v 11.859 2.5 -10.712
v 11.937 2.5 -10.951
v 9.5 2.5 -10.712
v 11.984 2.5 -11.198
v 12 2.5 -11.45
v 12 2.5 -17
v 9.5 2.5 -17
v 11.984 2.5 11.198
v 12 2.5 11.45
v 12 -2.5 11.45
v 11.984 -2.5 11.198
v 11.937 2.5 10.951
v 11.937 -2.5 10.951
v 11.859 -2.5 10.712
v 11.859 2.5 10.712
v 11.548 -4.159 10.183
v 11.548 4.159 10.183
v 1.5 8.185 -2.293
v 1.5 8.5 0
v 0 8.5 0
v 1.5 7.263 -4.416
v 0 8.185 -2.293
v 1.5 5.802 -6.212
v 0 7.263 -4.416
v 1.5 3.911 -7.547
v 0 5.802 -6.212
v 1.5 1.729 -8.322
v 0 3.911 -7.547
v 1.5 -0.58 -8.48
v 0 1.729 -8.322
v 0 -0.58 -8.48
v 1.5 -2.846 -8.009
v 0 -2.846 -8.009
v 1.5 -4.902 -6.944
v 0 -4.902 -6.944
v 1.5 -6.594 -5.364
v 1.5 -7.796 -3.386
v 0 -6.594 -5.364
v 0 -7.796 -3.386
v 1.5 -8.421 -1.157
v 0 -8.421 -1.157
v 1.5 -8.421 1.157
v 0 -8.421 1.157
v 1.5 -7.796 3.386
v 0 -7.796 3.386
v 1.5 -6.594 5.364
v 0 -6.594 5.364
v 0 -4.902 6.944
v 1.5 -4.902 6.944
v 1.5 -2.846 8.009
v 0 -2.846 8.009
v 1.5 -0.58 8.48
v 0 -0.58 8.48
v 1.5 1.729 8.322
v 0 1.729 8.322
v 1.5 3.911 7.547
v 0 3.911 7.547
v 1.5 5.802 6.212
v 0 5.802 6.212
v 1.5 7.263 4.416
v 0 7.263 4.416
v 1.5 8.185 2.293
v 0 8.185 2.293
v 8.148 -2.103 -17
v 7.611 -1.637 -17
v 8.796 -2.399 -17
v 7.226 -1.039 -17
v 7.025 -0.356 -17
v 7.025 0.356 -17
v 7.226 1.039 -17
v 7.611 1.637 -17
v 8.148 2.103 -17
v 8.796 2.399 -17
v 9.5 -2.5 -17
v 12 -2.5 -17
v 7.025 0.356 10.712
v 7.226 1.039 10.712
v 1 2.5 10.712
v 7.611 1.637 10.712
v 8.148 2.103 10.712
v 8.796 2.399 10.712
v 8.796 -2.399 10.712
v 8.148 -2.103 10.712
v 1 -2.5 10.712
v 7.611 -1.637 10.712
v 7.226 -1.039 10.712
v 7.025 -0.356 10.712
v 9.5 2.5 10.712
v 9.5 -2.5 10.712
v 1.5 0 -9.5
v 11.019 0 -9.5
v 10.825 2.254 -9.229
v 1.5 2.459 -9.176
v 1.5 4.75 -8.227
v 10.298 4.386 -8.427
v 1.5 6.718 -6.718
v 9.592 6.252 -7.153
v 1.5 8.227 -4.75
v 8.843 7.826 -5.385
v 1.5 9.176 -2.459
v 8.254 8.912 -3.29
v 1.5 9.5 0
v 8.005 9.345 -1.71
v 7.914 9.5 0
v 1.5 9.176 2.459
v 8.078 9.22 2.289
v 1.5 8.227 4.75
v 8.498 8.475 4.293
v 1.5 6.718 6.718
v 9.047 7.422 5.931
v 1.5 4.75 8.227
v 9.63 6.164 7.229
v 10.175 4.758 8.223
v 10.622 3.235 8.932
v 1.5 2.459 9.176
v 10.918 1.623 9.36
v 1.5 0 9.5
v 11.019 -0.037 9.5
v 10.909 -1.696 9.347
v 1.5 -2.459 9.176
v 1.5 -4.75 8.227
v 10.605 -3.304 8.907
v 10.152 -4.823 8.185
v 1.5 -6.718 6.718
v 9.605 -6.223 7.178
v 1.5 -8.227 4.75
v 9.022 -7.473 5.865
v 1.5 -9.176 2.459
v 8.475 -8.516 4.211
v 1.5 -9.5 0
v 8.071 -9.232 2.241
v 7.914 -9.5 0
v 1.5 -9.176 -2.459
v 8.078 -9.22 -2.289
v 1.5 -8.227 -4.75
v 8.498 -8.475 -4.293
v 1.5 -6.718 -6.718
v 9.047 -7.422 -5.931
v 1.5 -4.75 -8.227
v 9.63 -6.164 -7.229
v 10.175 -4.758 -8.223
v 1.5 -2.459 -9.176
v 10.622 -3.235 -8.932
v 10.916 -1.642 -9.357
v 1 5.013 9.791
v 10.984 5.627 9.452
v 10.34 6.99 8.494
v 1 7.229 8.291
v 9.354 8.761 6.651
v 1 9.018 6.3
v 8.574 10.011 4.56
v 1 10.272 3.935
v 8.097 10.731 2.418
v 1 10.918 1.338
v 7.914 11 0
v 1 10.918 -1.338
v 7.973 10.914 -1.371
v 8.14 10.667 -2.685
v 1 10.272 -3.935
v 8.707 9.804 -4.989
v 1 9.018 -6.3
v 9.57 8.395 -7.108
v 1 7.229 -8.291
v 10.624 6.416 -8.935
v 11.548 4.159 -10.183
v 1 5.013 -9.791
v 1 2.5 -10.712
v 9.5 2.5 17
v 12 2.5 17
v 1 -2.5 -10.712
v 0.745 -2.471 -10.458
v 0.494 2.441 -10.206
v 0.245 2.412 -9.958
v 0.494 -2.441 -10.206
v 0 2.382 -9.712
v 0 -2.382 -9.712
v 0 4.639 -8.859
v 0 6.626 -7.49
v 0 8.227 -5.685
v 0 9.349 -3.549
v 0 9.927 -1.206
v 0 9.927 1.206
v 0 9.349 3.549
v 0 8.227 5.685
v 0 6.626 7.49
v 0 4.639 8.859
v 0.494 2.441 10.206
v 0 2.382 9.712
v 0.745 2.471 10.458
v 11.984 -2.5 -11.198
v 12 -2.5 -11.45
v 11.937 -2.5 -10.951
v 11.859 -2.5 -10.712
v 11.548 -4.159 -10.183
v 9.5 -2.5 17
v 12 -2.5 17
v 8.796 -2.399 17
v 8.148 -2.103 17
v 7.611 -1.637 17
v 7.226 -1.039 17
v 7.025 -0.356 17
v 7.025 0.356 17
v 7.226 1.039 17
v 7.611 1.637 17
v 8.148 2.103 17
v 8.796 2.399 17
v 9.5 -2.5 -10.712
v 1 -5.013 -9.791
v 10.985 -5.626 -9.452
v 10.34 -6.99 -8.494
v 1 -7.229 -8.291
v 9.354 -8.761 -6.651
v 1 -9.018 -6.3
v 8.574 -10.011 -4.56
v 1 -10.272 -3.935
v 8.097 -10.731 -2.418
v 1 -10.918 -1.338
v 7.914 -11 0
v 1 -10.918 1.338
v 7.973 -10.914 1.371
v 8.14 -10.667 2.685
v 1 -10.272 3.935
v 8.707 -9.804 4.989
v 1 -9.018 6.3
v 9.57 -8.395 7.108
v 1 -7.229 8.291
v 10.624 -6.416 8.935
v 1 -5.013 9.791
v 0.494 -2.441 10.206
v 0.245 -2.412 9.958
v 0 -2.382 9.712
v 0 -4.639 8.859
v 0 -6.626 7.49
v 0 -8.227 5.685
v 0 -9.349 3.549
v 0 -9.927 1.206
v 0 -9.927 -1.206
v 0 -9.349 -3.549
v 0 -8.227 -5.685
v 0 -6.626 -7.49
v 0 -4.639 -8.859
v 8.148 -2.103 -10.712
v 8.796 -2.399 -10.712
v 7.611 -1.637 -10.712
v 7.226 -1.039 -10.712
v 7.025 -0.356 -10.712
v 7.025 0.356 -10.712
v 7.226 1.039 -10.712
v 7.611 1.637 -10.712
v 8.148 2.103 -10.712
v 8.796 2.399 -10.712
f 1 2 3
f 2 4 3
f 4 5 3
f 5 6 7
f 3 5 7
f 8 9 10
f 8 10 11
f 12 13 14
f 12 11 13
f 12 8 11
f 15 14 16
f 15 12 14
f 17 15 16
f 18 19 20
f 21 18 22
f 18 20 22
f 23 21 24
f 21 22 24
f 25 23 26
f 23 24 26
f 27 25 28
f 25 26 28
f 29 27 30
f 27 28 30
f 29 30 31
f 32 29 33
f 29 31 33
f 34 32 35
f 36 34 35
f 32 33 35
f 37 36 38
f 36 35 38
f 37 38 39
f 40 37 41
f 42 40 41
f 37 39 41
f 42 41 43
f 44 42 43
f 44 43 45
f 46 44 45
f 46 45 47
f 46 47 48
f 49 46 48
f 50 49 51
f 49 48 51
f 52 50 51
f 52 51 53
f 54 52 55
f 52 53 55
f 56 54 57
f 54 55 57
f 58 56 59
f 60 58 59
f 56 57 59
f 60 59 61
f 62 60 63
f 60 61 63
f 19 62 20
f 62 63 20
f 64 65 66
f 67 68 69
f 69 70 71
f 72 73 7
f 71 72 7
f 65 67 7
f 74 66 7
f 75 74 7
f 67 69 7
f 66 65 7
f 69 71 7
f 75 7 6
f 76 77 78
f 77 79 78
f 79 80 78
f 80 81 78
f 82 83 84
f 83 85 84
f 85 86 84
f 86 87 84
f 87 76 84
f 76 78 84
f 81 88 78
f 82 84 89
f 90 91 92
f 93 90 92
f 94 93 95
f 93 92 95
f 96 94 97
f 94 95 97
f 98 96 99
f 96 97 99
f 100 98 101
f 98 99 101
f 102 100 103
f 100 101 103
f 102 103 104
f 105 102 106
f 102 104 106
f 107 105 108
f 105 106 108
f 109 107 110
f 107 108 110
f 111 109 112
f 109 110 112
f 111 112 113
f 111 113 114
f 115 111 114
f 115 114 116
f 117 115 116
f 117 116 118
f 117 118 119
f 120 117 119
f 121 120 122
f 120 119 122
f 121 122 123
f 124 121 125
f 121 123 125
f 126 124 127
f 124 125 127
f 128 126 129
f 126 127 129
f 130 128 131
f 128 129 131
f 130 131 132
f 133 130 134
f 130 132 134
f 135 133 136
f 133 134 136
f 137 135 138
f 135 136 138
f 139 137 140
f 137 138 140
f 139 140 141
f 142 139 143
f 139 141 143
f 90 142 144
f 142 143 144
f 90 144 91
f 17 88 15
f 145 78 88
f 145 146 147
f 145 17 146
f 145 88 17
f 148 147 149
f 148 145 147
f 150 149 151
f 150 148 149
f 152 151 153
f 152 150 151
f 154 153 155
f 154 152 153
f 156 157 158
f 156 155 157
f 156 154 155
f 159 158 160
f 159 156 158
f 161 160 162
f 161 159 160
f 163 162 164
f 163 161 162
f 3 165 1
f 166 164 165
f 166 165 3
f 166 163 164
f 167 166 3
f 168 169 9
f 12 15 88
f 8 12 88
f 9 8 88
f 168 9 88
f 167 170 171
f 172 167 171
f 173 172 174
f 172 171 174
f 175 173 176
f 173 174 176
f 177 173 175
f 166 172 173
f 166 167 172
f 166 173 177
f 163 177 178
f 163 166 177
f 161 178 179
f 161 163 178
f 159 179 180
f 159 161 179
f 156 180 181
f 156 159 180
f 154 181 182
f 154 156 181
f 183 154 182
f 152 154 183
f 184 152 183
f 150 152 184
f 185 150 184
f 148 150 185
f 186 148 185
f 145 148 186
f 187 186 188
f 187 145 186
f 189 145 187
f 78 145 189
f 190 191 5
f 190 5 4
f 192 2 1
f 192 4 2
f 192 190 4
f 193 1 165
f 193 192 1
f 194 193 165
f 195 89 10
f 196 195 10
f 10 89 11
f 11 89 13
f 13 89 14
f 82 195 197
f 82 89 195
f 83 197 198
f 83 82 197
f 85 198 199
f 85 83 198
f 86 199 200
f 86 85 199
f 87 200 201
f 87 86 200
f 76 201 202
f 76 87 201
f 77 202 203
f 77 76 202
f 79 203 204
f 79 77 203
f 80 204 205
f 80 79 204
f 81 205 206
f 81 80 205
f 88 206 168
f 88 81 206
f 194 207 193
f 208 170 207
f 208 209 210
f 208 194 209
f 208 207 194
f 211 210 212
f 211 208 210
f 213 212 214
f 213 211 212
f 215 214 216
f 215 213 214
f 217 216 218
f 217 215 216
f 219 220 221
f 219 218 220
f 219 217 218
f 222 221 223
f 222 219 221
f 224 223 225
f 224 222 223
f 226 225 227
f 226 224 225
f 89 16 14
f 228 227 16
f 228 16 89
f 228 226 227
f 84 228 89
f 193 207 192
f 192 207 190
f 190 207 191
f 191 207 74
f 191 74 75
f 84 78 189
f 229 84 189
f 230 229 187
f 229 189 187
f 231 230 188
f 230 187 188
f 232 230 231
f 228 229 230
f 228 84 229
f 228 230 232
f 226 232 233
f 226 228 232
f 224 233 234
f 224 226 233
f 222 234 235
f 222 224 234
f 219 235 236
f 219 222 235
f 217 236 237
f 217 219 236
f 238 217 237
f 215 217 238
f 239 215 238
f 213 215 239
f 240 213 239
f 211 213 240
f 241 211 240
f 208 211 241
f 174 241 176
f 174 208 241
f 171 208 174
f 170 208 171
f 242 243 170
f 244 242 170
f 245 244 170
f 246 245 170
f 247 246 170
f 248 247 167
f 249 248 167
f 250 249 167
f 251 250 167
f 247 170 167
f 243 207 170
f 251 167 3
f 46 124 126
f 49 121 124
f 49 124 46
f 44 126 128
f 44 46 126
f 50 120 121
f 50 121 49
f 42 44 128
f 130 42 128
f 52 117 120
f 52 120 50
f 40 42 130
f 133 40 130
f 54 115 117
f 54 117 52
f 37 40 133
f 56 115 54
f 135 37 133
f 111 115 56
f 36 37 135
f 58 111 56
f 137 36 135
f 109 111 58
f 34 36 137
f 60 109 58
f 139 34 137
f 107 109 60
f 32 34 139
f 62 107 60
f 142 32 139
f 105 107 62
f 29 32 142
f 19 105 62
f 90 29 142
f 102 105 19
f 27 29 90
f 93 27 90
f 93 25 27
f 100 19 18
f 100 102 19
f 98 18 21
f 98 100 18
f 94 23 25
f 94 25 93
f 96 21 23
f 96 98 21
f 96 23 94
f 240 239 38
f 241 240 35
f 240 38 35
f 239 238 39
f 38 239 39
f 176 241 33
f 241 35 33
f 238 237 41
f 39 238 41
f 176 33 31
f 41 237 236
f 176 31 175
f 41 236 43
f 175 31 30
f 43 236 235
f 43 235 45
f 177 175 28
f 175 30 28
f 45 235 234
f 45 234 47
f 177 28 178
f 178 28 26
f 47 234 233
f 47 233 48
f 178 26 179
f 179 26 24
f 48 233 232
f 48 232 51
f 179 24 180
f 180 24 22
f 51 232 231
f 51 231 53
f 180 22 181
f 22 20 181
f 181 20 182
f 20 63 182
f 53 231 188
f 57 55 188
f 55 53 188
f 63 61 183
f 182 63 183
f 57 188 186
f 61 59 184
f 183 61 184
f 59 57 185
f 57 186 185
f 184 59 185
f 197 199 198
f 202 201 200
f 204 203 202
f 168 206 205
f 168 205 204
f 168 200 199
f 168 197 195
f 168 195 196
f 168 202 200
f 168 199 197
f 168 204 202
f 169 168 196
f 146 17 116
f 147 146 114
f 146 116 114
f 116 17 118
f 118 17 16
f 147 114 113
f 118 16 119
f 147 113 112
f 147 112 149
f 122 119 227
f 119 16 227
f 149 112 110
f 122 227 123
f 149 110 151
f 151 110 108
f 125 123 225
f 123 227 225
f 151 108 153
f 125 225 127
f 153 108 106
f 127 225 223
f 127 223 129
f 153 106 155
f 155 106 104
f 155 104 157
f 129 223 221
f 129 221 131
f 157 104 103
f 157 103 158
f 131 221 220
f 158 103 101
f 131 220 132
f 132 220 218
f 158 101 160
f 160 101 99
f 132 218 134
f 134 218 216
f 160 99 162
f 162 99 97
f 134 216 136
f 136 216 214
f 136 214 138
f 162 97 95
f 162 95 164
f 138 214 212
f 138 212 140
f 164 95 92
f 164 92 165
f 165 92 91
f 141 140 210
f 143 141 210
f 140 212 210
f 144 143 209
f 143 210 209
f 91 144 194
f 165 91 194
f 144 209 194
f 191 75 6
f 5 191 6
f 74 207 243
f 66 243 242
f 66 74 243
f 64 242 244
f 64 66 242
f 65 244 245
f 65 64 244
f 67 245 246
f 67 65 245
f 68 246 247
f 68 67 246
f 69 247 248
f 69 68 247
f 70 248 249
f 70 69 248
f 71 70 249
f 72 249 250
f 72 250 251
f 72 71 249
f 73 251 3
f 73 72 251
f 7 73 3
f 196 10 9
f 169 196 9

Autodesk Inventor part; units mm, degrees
ref_plane "YZ Plane" through (0, 0, 0) normal (1, 0, 0) x (0, 1, 0)
ref_plane "XZ Plane" through (0, 0, 0) normal (0, 1, 0) x (-1, 0, 0)
ref_plane "XY Plane" through (0, 0, 0) normal (0, 0, 1) x (1, 0, 0)
sketch "Sketch1" plane through (0, 0, 0) normal (1, 0, 0) x (0, 1, 0)
  circle A0 centre (0, 0) radius 11
  circle A1 centre (0, 0) radius 8.5
  line L0 (2.5, 10.712143) -> (-2.5, 10.712143)
  line L1 (-2.5, 10.712143) -> (-2.5, -10.712143)
  line L2 (-2.5, -10.712143) -> (2.5, -10.712143)
  line L3 (2.5, -10.712143) -> (2.5, 10.712143)
  line L4 (2.5, 10.712143) -> (-2.5, -10.712143) construction
  line L5 (-2.5, 10.712143) -> (2.5, -10.712143) construction
  dimension "d0" = 22
  dimension "d3" = 17
  dimension "d18" = 5
extrude "Extrusion1" add sketch "Sketch1" along normal blind 12 contours A0 L3 A1 | L3 A1 L1 L0 | L2 L1 A1 L3 | L1 A1 A0
sketch "Sketch2" plane through (0, 0, 0) normal (0, 0, 1) x (1, 0, 0)
  line L0 (14.5, 2.5) -> (9.5, 2.5)
  line L1 (9.5, 2.5) -> (9.5, -2.5)
  line L2 (9.5, -2.5) -> (14.5, -2.5)
  line L3 (14.5, -2.5) -> (14.5, 2.5)
  line L4 (14.5, 2.5) -> (9.5, -2.5) construction
  line L5 (9.5, 2.5) -> (14.5, -2.5) construction
  circle A0 centre (9.5, 0) radius 2.5
  line L6 (12, -2.5) -> (12, 2.5) projected
  point P0 (0, 0)
  point P1 (9.5, 2.5)
  point P2 (12, 0)
  dimension "d4" = 5
  dimension "d5" = 5
extrude "Extrusion2" add sketch "Sketch2" along normal mid plane 34 contours L6 A0 L0 | A0 L1 | L1 A0 | L6 L2 A0
sketch "Sketch3" plane through (12, 0, 0) normal (1, 0, 0) x (0, 0, -1)
  circle A0 centre (0, 0) radius 9.5
  dimension "d8" = 19
extrude "Extrusion3" cut sketch "Sketch3" against normal blind 10.5
chamfer "Chamfer1" distance 1 angle 45 4 edges at (0, -11, 0) (0, 11, 0) (0, 0, -10.7121) (0, 0, 10.7121)
sketch "Sketch4" plane through (0, 0, 0) normal (0, 1, 0) x (-1, 0, 0)
  line L0 (-12, 10.712143) -> (-12, -10.712143)
  circle A0 centre (-24, 0) radius 16.085708
  line L1 (-12, 0) -> (-24, 0) construction
  point P0 (0, 0)
  point P1 (-12, 10.712143)
  dimension "d14" = 12
extrude "Extrusion4" cut sketch "Sketch4" along normal through all both and the other way through all contours A0 L0 picked at (-11.258553, -2.503733)
fillet "Fillet1" radius 2 2 edges at (12, 0, -10.7121) (12, 0, 10.7121)
properties part number "Cup" material "Aluminum 6061"
